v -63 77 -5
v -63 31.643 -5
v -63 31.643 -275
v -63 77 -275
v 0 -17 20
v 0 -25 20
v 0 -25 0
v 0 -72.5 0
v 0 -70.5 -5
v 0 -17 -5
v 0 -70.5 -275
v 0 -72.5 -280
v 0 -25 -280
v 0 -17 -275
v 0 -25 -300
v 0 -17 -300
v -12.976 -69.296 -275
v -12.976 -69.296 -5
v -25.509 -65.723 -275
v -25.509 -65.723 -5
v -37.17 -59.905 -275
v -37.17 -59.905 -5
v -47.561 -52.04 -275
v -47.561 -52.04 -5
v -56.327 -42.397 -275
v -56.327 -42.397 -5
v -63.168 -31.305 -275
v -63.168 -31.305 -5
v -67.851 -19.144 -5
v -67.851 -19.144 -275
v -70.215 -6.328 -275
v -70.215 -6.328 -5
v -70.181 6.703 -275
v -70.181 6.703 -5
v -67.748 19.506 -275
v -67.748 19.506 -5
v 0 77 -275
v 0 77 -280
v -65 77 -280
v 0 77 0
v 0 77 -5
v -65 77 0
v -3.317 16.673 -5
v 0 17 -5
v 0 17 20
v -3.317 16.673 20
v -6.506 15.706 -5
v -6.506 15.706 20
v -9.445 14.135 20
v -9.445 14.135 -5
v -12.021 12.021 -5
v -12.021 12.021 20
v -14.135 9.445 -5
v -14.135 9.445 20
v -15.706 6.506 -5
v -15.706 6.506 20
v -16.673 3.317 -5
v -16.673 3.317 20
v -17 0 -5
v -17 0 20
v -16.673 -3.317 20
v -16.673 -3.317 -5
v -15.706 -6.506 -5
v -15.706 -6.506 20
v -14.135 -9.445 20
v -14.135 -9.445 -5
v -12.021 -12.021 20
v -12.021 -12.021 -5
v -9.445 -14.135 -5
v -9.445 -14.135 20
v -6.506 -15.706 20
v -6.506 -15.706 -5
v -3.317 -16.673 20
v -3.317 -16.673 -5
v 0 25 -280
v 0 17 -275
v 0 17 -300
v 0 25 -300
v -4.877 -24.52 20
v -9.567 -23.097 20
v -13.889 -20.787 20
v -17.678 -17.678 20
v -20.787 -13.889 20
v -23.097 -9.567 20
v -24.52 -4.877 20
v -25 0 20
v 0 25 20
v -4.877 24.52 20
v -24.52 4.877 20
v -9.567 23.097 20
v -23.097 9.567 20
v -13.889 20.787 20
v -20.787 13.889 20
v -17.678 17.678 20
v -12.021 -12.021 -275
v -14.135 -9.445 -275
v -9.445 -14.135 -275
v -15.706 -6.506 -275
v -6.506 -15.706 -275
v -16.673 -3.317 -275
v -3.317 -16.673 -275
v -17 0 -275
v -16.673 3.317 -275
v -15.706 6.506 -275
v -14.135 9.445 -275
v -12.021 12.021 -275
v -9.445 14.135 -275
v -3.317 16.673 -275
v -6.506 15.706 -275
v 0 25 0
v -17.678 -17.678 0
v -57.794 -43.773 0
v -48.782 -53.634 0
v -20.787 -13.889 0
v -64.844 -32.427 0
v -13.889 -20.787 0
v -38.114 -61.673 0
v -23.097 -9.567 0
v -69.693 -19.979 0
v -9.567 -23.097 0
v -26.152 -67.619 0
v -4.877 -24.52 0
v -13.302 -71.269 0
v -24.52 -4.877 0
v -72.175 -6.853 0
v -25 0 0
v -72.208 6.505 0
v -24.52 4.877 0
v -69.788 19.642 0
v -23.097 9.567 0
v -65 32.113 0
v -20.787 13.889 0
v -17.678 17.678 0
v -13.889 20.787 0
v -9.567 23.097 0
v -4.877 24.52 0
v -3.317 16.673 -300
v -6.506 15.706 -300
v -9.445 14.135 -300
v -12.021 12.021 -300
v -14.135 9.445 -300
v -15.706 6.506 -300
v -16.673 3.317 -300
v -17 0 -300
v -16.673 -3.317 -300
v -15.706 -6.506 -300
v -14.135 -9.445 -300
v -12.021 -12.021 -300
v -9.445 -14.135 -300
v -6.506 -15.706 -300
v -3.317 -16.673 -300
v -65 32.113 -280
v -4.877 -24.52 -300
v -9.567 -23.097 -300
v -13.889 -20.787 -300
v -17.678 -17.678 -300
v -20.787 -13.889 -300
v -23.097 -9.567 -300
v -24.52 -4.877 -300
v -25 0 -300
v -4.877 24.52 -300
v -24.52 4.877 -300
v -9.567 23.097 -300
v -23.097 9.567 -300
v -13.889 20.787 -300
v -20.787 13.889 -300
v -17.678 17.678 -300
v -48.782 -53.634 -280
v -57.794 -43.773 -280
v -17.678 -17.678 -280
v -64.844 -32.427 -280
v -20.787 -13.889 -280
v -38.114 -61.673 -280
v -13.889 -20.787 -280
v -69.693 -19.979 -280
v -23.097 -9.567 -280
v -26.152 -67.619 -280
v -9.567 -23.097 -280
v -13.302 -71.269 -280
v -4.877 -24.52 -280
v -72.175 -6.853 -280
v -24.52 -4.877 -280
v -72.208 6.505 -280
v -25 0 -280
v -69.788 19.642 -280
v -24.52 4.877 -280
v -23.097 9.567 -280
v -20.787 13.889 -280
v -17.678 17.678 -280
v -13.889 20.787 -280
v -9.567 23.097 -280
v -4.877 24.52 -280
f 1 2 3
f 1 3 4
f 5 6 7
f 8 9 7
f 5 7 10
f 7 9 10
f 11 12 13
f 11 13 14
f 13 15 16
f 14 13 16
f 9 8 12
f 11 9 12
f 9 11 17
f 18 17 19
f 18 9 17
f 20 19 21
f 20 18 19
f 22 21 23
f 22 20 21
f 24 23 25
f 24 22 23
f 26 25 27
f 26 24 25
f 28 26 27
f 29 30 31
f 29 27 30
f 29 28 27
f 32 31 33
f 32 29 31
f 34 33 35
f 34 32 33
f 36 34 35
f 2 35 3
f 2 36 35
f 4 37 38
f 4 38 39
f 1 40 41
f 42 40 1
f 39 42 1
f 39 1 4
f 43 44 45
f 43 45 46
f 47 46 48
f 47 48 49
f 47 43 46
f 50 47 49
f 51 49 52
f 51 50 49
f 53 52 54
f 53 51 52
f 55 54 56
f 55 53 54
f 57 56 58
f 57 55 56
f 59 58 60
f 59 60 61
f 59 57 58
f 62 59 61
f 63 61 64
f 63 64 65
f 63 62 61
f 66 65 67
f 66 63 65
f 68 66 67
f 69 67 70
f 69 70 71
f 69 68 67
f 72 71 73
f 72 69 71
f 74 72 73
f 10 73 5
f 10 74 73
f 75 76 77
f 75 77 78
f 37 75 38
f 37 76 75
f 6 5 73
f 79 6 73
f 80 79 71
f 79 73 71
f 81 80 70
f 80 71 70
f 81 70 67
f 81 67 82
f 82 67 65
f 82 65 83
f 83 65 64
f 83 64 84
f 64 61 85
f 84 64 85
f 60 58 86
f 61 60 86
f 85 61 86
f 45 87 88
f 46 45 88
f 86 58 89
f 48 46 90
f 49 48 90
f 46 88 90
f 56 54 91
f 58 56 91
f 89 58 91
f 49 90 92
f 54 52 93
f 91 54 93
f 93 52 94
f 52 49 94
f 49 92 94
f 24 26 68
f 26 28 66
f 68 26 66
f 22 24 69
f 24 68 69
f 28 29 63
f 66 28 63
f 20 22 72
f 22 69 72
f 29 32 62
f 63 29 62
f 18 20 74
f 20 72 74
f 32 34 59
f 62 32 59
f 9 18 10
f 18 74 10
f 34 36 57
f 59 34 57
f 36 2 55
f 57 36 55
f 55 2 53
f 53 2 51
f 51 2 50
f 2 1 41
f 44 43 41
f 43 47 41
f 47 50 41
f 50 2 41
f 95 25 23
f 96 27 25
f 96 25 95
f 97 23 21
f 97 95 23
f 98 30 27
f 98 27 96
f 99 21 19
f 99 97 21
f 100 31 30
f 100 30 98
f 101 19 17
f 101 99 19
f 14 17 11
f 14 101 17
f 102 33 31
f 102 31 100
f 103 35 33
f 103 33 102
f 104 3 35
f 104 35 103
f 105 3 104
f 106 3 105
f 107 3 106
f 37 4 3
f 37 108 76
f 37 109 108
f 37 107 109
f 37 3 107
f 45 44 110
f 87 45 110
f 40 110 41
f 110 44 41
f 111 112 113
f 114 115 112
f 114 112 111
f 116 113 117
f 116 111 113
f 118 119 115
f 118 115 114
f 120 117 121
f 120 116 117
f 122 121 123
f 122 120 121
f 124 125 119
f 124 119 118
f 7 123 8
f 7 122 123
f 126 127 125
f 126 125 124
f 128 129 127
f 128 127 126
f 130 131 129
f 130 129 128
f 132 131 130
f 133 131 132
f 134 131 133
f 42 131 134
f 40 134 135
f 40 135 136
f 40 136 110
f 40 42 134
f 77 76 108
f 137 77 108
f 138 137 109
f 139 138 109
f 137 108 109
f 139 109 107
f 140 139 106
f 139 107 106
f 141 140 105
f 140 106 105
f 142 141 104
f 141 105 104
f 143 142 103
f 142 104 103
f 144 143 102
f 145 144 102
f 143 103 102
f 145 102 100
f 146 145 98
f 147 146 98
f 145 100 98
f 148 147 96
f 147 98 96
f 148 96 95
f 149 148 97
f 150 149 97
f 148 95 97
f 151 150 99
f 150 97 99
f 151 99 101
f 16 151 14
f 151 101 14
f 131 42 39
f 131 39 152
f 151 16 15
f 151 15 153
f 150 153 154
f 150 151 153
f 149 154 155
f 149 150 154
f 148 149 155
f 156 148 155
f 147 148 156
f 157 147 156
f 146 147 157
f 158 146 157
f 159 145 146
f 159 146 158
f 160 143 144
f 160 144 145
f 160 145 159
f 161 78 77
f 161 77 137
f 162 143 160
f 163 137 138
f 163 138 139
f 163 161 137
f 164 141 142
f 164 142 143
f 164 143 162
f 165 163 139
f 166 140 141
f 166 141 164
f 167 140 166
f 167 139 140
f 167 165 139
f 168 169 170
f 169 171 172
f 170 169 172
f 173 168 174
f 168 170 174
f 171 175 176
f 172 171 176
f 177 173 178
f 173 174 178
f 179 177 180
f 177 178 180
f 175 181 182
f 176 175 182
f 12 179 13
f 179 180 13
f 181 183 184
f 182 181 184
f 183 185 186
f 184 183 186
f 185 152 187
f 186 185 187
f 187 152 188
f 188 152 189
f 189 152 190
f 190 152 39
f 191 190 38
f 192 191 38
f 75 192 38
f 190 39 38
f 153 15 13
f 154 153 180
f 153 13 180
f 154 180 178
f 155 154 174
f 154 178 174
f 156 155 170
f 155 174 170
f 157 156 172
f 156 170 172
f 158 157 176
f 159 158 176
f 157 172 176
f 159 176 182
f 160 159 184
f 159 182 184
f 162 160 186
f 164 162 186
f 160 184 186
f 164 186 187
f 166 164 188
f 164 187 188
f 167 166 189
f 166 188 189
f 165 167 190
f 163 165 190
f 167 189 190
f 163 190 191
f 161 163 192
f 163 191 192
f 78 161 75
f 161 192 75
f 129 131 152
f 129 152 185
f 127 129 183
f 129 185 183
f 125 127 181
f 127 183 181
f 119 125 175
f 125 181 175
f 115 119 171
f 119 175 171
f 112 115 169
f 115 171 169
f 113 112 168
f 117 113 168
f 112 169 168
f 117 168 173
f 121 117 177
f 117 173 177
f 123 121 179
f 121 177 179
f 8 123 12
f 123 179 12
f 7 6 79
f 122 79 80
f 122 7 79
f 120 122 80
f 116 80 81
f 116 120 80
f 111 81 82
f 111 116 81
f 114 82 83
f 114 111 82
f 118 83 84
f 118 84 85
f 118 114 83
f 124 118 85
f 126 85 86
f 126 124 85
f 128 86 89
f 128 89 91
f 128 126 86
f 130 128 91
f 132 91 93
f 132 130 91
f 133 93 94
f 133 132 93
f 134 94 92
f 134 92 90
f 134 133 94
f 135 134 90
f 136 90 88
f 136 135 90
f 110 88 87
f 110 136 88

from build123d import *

# Parameters (mm, degrees)
BOSS_EXTRUDE1_DEPTH      = 20
BOSS_EXTRUDE1_DEPTH_BACK = 5
BOSS_EXTRUDE2_START      = -5
BOSS_EXTRUDE2_DEPTH      = 5
BOSS_EXTRUDE4_REACH      = 315.385


with BuildPart() as part:
    # Sketch1 → Boss-Extrude1 (new, two sides: drawn at the far end of the back side and taken through both)
    with BuildSketch(Plane.XY.offset(-BOSS_EXTRUDE1_DEPTH_BACK)):
        with BuildLine():
            Line((0, 25), (0, 17))
            ThreePointArc((0, 17), (-17, 0), (0, -17))
            Line((0, -17), (0, -25))
            ThreePointArc((0, -25), (-25, 0), (0, 25))
        make_face()
    extrude(amount=BOSS_EXTRUDE1_DEPTH + BOSS_EXTRUDE1_DEPTH_BACK)

    # Sketch2 → Boss-Extrude2 (add)
    with BuildSketch(Plane.XY.offset(BOSS_EXTRUDE2_START)):
        with BuildLine():
            Line((0, 25), (0, 77))
            Line((0, 77), (-65, 77))
            Line((-65, 77), (-65, 32.113081447))
            ThreePointArc((-65, 32.113081447), (-61.581037686, -38.262590053), (0, -72.5))
            Line((0, -72.5), (0, -25))
            ThreePointArc((0, -25), (-25, 0), (0, 25))
        make_face()
    extrude(amount=BOSS_EXTRUDE2_DEPTH)


with BuildPart() as body_2:
    # Mirror1: mirrored copy
    add(part.part.mirror(Plane.XY.offset(-140)))

    # Sketch3 → Boss-Extrude4 (add, up to next)
    with BuildSketch(Plane(origin=(0, 0, -5), x_dir=(-1, 0, 0), z_dir=(0, 0, -1)), mode=Mode.PRIVATE) as boss_extrude4_sk1:
        with BuildLine():
            Line((63, 31.642534665), (63, 77))
            Line((63, 77), (65, 77))
            Line((65, 77), (65, 32.113081447))
            ThreePointArc((65, 32.113081447), (61.581037686, -38.262590053), (0, -72.5))
            Line((0, -72.5), (0, -70.5))
            ThreePointArc((0, -70.5), (60.004369399, -37.009804823), (63, 31.642534665))
        make_face()
    boss_extrude4_tool1 = extrude(boss_extrude4_sk1.sketch, amount=BOSS_EXTRUDE4_REACH, mode=Mode.PRIVATE) - body_2.part

    add(part.part)  # Boss-Extrude4 merges part
    add(boss_extrude4_tool1.solids().sort_by_distance((-64.66152, 54.321267, -5))[0])


solid = body_2.part
